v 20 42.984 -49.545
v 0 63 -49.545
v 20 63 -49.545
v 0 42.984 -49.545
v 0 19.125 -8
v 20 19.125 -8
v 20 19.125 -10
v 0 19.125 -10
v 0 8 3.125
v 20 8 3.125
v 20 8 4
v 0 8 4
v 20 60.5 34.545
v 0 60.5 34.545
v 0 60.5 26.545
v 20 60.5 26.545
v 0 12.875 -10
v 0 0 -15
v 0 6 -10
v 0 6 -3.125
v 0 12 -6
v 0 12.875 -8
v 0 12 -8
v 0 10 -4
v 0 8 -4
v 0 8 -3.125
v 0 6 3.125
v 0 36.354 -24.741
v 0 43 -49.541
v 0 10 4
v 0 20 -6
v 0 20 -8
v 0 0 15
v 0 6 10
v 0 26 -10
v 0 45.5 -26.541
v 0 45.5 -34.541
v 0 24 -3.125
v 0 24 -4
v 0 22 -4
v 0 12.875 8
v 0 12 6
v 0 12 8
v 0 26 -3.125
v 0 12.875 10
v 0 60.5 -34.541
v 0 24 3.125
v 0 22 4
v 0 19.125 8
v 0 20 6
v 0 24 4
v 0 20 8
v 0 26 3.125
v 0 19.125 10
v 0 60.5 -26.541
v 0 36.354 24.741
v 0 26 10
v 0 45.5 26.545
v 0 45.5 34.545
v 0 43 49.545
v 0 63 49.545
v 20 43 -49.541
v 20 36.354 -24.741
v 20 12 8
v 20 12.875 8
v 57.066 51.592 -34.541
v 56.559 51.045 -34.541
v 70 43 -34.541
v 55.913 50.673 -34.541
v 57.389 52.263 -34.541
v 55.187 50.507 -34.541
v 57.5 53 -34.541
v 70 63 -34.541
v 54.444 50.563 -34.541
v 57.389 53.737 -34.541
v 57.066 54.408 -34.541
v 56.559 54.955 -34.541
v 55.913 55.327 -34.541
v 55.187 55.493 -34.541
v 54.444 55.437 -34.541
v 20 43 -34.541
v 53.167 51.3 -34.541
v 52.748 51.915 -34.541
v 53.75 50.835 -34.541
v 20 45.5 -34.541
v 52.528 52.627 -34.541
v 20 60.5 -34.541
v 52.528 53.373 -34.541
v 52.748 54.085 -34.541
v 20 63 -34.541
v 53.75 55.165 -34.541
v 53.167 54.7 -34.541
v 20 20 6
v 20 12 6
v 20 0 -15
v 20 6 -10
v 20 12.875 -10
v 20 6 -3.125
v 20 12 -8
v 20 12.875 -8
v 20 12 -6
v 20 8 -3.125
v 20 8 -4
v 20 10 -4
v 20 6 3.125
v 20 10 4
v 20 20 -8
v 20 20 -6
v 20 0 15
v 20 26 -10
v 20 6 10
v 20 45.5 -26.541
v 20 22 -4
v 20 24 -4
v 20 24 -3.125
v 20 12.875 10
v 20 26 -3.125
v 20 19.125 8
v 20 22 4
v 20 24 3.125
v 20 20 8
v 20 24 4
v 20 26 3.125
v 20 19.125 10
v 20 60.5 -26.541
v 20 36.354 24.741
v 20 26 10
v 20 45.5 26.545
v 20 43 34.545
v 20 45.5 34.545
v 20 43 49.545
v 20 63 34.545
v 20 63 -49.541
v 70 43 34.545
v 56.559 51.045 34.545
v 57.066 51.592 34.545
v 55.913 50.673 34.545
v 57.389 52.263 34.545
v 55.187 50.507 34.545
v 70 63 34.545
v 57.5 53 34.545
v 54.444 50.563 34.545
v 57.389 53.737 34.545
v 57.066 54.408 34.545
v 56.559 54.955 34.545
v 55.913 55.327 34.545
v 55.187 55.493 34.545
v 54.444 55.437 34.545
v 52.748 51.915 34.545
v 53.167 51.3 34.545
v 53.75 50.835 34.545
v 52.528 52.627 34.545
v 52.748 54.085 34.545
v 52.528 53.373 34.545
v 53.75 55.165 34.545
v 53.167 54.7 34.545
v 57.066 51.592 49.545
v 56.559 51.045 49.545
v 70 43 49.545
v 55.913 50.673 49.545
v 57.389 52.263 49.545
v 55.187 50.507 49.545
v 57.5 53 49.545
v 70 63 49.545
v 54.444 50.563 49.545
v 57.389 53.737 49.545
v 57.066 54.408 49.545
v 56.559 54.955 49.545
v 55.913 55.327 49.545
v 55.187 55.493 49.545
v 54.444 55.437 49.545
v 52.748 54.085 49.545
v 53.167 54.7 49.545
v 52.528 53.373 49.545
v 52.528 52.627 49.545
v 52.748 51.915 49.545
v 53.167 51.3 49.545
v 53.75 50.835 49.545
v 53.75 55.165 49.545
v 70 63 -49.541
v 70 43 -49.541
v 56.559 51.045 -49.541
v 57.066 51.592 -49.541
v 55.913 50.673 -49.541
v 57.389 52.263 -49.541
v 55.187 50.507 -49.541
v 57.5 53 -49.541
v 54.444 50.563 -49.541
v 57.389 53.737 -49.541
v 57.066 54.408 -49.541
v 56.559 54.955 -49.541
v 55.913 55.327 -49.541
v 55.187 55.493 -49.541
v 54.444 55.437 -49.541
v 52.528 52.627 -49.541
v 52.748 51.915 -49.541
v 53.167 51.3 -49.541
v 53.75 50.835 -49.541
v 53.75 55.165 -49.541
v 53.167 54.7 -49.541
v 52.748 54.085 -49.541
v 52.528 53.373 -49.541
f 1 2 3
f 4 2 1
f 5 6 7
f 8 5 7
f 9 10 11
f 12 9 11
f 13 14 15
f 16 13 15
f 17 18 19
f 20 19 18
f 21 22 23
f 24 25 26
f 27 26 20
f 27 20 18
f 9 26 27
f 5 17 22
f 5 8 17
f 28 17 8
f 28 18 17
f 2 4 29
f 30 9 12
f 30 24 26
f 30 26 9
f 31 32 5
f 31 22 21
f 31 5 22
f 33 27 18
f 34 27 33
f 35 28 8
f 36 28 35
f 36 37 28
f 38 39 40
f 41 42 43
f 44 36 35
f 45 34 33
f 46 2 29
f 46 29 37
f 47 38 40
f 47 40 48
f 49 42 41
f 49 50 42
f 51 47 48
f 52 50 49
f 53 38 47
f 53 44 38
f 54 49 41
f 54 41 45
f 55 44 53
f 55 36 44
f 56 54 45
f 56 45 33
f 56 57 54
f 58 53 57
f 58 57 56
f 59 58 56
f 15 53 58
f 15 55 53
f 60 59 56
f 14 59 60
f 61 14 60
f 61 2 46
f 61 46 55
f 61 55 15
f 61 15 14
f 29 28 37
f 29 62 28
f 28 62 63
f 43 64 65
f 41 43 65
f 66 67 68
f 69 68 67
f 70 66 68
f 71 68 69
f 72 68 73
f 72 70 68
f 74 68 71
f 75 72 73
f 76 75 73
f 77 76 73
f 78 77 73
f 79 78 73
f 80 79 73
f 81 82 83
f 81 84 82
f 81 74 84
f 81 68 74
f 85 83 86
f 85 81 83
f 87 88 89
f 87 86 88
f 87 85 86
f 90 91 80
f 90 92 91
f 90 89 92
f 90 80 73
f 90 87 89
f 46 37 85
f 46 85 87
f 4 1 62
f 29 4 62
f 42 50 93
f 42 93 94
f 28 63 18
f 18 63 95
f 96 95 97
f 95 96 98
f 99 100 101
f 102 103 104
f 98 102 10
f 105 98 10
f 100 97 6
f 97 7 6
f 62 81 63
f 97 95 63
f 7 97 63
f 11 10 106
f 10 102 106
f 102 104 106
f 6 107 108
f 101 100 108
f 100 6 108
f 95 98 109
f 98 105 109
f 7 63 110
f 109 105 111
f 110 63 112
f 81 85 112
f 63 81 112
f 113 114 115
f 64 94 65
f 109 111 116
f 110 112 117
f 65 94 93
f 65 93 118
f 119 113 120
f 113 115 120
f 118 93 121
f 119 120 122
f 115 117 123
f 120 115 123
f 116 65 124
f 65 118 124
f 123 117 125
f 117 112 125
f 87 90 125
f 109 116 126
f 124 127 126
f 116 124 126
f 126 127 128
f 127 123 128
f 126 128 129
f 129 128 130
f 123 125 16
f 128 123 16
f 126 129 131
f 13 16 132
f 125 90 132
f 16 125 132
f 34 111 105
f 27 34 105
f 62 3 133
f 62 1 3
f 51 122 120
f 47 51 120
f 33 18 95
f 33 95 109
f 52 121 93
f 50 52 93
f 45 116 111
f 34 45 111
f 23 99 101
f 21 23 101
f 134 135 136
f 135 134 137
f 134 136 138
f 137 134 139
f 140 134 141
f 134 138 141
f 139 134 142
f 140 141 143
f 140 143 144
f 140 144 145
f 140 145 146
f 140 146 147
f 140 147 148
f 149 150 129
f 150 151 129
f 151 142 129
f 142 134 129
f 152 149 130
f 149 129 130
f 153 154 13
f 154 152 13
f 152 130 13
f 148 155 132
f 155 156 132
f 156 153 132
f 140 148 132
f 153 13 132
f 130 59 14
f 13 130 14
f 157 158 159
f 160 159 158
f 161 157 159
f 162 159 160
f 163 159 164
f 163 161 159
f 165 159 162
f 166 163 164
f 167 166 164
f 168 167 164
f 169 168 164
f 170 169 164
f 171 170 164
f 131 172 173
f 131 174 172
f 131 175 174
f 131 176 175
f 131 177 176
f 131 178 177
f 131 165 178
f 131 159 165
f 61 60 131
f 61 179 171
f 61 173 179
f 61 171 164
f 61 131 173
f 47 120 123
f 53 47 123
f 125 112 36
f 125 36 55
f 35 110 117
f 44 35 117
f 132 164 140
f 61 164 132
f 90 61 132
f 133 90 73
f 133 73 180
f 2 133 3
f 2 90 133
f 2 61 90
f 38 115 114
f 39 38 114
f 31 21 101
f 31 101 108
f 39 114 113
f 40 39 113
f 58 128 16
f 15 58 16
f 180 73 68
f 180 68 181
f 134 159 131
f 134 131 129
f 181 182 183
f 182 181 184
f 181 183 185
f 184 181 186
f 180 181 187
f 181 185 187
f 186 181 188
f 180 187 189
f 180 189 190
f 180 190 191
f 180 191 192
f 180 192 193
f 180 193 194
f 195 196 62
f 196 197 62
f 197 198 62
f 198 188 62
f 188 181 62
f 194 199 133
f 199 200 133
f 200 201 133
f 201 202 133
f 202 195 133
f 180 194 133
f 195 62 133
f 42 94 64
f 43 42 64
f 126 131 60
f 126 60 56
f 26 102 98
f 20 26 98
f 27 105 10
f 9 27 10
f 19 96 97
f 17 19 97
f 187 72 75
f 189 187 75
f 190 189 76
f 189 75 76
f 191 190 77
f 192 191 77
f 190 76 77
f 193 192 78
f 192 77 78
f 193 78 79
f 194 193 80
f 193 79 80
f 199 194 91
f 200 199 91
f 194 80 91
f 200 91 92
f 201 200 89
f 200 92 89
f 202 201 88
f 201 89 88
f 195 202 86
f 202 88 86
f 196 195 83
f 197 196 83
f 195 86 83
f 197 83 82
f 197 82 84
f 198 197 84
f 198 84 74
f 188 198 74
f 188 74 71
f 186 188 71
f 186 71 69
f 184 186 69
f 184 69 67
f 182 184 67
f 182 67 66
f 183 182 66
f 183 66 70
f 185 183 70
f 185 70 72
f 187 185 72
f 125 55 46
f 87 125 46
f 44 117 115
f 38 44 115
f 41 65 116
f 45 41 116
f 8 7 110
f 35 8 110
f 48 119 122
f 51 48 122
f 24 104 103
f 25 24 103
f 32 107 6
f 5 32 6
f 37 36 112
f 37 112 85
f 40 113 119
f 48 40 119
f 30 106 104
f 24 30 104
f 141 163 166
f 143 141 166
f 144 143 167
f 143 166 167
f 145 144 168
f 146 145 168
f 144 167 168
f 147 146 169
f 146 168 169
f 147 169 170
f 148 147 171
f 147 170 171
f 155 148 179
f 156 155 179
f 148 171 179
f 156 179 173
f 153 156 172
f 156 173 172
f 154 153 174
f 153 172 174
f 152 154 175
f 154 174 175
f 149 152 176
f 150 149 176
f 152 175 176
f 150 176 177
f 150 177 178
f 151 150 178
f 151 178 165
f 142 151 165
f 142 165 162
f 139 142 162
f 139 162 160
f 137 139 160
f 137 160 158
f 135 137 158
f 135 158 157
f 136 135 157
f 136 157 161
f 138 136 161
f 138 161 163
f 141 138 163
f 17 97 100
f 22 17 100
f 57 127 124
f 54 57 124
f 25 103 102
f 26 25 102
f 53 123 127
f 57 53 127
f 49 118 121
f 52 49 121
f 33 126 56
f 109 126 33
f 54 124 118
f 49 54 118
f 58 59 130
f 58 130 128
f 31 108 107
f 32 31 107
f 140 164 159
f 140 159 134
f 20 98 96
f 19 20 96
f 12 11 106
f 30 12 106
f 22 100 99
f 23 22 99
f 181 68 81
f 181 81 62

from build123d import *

# Parameters (mm, degrees)
BOSS_EXTRUDE1_DEPTH = 20
CUT_EXTRUDE1_DEPTH  = 20
SKETCH4_W           = 15
SKETCH4_H           = 20
BOSS_EXTRUDE2_DEPTH = 50
SKETCH5_R           = 2.5
CUT_EXTRUDE2_DEPTH  = 137.703431193
SKETCH6_W           = 8
SKETCH6_H           = 15
CUT_EXTRUDE3_DEPTH  = 95.465374741
CUT_EXTRUDE4_DEPTH  = 95.465374741


with BuildPart() as part:
    # Sketch1 → Boss-Extrude1 (new body)
    with BuildSketch(Plane(origin=(0, 0, 0), x_dir=(0, 0, -1), z_dir=(1, 0, 0))):
        Polygon((15, 0), (-15, 0), (-49.545, 31.5), (-49.545, 63), (49.545, 63), (49.545, 31.5), align=None)
    extrude(amount=BOSS_EXTRUDE1_DEPTH)

    # Sketch3 → Cut-Extrude1 (cut)
    with BuildSketch(Plane(origin=(20, 0, 0), x_dir=(0, 0, -1), z_dir=(1, 0, 0))):
        Polygon((-10, 12.875), (-10, 6), (-3.125, 6), (-3.125, 8), (-4, 8), (-4, 10), (4, 10), (4, 8), (3.125, 8), (3.125, 6), (10, 6), (10, 12.875), (8, 12.875), (8, 12), (6, 12), (6, 20), (8, 20), (8, 19.125), (10, 19.125), (10, 26), (3.125, 26), (3.125, 24), (4, 24), (4, 22), (-4, 22), (-4, 24), (-3.125, 24), (-3.125, 26), (-10, 26), (-10, 19.125), (-8, 19.125), (-8, 20), (-6, 20), (-6, 12), (-8, 12), (-8, 12.875), align=None)
    extrude(amount=-CUT_EXTRUDE1_DEPTH, mode=Mode.SUBTRACT)

    # Sketch4 → Boss-Extrude2 (add)
    with BuildSketch(Plane(origin=(20, 0, 0), x_dir=(0, 0, -1), z_dir=(1, 0, 0))):
        with Locations((-42.045, 53)):
            Rectangle(SKETCH4_W, SKETCH4_H)
        with Locations((42.040757, 53)):
            Rectangle(SKETCH4_W, SKETCH4_H)
    extrude(amount=BOSS_EXTRUDE2_DEPTH)

    # Sketch5 → Cut-Extrude2 (cut, through all)
    with BuildSketch(Plane.XY.offset(49.545)):
        with Locations((55, 53)):
            Circle(SKETCH5_R)
    extrude(amount=-CUT_EXTRUDE2_DEPTH, mode=Mode.SUBTRACT)

    # Sketch6 → Cut-Extrude3 (cut, through all)
    with BuildSketch(Plane(origin=(20, 0, 0), x_dir=(0, 0, -1), z_dir=(1, 0, 0))):
        with Locations((-30.545, 53)):
            Rectangle(SKETCH6_W, SKETCH6_H)
        with Locations((30.540757, 53)):
            Rectangle(SKETCH6_W, SKETCH6_H)
    extrude(amount=-CUT_EXTRUDE3_DEPTH, mode=Mode.SUBTRACT)

    # Sketch7 → Cut-Extrude4 (cut, through all)
    with BuildSketch(Plane(origin=(20, 0, 0), x_dir=(0, 0, -1), z_dir=(1, 0, 0))):
        Polygon((-49.545, 43), (-24.740965738, 36.353779051), (-15, 0), (-52.774772494, 23.355056254), align=None)
        Polygon((49.540757, 43), (24.740965738, 36.353779051), (15, 0), (56.193227383, 18.176889525), align=None)
    extrude(amount=-CUT_EXTRUDE4_DEPTH, mode=Mode.SUBTRACT)


solid = part.part
